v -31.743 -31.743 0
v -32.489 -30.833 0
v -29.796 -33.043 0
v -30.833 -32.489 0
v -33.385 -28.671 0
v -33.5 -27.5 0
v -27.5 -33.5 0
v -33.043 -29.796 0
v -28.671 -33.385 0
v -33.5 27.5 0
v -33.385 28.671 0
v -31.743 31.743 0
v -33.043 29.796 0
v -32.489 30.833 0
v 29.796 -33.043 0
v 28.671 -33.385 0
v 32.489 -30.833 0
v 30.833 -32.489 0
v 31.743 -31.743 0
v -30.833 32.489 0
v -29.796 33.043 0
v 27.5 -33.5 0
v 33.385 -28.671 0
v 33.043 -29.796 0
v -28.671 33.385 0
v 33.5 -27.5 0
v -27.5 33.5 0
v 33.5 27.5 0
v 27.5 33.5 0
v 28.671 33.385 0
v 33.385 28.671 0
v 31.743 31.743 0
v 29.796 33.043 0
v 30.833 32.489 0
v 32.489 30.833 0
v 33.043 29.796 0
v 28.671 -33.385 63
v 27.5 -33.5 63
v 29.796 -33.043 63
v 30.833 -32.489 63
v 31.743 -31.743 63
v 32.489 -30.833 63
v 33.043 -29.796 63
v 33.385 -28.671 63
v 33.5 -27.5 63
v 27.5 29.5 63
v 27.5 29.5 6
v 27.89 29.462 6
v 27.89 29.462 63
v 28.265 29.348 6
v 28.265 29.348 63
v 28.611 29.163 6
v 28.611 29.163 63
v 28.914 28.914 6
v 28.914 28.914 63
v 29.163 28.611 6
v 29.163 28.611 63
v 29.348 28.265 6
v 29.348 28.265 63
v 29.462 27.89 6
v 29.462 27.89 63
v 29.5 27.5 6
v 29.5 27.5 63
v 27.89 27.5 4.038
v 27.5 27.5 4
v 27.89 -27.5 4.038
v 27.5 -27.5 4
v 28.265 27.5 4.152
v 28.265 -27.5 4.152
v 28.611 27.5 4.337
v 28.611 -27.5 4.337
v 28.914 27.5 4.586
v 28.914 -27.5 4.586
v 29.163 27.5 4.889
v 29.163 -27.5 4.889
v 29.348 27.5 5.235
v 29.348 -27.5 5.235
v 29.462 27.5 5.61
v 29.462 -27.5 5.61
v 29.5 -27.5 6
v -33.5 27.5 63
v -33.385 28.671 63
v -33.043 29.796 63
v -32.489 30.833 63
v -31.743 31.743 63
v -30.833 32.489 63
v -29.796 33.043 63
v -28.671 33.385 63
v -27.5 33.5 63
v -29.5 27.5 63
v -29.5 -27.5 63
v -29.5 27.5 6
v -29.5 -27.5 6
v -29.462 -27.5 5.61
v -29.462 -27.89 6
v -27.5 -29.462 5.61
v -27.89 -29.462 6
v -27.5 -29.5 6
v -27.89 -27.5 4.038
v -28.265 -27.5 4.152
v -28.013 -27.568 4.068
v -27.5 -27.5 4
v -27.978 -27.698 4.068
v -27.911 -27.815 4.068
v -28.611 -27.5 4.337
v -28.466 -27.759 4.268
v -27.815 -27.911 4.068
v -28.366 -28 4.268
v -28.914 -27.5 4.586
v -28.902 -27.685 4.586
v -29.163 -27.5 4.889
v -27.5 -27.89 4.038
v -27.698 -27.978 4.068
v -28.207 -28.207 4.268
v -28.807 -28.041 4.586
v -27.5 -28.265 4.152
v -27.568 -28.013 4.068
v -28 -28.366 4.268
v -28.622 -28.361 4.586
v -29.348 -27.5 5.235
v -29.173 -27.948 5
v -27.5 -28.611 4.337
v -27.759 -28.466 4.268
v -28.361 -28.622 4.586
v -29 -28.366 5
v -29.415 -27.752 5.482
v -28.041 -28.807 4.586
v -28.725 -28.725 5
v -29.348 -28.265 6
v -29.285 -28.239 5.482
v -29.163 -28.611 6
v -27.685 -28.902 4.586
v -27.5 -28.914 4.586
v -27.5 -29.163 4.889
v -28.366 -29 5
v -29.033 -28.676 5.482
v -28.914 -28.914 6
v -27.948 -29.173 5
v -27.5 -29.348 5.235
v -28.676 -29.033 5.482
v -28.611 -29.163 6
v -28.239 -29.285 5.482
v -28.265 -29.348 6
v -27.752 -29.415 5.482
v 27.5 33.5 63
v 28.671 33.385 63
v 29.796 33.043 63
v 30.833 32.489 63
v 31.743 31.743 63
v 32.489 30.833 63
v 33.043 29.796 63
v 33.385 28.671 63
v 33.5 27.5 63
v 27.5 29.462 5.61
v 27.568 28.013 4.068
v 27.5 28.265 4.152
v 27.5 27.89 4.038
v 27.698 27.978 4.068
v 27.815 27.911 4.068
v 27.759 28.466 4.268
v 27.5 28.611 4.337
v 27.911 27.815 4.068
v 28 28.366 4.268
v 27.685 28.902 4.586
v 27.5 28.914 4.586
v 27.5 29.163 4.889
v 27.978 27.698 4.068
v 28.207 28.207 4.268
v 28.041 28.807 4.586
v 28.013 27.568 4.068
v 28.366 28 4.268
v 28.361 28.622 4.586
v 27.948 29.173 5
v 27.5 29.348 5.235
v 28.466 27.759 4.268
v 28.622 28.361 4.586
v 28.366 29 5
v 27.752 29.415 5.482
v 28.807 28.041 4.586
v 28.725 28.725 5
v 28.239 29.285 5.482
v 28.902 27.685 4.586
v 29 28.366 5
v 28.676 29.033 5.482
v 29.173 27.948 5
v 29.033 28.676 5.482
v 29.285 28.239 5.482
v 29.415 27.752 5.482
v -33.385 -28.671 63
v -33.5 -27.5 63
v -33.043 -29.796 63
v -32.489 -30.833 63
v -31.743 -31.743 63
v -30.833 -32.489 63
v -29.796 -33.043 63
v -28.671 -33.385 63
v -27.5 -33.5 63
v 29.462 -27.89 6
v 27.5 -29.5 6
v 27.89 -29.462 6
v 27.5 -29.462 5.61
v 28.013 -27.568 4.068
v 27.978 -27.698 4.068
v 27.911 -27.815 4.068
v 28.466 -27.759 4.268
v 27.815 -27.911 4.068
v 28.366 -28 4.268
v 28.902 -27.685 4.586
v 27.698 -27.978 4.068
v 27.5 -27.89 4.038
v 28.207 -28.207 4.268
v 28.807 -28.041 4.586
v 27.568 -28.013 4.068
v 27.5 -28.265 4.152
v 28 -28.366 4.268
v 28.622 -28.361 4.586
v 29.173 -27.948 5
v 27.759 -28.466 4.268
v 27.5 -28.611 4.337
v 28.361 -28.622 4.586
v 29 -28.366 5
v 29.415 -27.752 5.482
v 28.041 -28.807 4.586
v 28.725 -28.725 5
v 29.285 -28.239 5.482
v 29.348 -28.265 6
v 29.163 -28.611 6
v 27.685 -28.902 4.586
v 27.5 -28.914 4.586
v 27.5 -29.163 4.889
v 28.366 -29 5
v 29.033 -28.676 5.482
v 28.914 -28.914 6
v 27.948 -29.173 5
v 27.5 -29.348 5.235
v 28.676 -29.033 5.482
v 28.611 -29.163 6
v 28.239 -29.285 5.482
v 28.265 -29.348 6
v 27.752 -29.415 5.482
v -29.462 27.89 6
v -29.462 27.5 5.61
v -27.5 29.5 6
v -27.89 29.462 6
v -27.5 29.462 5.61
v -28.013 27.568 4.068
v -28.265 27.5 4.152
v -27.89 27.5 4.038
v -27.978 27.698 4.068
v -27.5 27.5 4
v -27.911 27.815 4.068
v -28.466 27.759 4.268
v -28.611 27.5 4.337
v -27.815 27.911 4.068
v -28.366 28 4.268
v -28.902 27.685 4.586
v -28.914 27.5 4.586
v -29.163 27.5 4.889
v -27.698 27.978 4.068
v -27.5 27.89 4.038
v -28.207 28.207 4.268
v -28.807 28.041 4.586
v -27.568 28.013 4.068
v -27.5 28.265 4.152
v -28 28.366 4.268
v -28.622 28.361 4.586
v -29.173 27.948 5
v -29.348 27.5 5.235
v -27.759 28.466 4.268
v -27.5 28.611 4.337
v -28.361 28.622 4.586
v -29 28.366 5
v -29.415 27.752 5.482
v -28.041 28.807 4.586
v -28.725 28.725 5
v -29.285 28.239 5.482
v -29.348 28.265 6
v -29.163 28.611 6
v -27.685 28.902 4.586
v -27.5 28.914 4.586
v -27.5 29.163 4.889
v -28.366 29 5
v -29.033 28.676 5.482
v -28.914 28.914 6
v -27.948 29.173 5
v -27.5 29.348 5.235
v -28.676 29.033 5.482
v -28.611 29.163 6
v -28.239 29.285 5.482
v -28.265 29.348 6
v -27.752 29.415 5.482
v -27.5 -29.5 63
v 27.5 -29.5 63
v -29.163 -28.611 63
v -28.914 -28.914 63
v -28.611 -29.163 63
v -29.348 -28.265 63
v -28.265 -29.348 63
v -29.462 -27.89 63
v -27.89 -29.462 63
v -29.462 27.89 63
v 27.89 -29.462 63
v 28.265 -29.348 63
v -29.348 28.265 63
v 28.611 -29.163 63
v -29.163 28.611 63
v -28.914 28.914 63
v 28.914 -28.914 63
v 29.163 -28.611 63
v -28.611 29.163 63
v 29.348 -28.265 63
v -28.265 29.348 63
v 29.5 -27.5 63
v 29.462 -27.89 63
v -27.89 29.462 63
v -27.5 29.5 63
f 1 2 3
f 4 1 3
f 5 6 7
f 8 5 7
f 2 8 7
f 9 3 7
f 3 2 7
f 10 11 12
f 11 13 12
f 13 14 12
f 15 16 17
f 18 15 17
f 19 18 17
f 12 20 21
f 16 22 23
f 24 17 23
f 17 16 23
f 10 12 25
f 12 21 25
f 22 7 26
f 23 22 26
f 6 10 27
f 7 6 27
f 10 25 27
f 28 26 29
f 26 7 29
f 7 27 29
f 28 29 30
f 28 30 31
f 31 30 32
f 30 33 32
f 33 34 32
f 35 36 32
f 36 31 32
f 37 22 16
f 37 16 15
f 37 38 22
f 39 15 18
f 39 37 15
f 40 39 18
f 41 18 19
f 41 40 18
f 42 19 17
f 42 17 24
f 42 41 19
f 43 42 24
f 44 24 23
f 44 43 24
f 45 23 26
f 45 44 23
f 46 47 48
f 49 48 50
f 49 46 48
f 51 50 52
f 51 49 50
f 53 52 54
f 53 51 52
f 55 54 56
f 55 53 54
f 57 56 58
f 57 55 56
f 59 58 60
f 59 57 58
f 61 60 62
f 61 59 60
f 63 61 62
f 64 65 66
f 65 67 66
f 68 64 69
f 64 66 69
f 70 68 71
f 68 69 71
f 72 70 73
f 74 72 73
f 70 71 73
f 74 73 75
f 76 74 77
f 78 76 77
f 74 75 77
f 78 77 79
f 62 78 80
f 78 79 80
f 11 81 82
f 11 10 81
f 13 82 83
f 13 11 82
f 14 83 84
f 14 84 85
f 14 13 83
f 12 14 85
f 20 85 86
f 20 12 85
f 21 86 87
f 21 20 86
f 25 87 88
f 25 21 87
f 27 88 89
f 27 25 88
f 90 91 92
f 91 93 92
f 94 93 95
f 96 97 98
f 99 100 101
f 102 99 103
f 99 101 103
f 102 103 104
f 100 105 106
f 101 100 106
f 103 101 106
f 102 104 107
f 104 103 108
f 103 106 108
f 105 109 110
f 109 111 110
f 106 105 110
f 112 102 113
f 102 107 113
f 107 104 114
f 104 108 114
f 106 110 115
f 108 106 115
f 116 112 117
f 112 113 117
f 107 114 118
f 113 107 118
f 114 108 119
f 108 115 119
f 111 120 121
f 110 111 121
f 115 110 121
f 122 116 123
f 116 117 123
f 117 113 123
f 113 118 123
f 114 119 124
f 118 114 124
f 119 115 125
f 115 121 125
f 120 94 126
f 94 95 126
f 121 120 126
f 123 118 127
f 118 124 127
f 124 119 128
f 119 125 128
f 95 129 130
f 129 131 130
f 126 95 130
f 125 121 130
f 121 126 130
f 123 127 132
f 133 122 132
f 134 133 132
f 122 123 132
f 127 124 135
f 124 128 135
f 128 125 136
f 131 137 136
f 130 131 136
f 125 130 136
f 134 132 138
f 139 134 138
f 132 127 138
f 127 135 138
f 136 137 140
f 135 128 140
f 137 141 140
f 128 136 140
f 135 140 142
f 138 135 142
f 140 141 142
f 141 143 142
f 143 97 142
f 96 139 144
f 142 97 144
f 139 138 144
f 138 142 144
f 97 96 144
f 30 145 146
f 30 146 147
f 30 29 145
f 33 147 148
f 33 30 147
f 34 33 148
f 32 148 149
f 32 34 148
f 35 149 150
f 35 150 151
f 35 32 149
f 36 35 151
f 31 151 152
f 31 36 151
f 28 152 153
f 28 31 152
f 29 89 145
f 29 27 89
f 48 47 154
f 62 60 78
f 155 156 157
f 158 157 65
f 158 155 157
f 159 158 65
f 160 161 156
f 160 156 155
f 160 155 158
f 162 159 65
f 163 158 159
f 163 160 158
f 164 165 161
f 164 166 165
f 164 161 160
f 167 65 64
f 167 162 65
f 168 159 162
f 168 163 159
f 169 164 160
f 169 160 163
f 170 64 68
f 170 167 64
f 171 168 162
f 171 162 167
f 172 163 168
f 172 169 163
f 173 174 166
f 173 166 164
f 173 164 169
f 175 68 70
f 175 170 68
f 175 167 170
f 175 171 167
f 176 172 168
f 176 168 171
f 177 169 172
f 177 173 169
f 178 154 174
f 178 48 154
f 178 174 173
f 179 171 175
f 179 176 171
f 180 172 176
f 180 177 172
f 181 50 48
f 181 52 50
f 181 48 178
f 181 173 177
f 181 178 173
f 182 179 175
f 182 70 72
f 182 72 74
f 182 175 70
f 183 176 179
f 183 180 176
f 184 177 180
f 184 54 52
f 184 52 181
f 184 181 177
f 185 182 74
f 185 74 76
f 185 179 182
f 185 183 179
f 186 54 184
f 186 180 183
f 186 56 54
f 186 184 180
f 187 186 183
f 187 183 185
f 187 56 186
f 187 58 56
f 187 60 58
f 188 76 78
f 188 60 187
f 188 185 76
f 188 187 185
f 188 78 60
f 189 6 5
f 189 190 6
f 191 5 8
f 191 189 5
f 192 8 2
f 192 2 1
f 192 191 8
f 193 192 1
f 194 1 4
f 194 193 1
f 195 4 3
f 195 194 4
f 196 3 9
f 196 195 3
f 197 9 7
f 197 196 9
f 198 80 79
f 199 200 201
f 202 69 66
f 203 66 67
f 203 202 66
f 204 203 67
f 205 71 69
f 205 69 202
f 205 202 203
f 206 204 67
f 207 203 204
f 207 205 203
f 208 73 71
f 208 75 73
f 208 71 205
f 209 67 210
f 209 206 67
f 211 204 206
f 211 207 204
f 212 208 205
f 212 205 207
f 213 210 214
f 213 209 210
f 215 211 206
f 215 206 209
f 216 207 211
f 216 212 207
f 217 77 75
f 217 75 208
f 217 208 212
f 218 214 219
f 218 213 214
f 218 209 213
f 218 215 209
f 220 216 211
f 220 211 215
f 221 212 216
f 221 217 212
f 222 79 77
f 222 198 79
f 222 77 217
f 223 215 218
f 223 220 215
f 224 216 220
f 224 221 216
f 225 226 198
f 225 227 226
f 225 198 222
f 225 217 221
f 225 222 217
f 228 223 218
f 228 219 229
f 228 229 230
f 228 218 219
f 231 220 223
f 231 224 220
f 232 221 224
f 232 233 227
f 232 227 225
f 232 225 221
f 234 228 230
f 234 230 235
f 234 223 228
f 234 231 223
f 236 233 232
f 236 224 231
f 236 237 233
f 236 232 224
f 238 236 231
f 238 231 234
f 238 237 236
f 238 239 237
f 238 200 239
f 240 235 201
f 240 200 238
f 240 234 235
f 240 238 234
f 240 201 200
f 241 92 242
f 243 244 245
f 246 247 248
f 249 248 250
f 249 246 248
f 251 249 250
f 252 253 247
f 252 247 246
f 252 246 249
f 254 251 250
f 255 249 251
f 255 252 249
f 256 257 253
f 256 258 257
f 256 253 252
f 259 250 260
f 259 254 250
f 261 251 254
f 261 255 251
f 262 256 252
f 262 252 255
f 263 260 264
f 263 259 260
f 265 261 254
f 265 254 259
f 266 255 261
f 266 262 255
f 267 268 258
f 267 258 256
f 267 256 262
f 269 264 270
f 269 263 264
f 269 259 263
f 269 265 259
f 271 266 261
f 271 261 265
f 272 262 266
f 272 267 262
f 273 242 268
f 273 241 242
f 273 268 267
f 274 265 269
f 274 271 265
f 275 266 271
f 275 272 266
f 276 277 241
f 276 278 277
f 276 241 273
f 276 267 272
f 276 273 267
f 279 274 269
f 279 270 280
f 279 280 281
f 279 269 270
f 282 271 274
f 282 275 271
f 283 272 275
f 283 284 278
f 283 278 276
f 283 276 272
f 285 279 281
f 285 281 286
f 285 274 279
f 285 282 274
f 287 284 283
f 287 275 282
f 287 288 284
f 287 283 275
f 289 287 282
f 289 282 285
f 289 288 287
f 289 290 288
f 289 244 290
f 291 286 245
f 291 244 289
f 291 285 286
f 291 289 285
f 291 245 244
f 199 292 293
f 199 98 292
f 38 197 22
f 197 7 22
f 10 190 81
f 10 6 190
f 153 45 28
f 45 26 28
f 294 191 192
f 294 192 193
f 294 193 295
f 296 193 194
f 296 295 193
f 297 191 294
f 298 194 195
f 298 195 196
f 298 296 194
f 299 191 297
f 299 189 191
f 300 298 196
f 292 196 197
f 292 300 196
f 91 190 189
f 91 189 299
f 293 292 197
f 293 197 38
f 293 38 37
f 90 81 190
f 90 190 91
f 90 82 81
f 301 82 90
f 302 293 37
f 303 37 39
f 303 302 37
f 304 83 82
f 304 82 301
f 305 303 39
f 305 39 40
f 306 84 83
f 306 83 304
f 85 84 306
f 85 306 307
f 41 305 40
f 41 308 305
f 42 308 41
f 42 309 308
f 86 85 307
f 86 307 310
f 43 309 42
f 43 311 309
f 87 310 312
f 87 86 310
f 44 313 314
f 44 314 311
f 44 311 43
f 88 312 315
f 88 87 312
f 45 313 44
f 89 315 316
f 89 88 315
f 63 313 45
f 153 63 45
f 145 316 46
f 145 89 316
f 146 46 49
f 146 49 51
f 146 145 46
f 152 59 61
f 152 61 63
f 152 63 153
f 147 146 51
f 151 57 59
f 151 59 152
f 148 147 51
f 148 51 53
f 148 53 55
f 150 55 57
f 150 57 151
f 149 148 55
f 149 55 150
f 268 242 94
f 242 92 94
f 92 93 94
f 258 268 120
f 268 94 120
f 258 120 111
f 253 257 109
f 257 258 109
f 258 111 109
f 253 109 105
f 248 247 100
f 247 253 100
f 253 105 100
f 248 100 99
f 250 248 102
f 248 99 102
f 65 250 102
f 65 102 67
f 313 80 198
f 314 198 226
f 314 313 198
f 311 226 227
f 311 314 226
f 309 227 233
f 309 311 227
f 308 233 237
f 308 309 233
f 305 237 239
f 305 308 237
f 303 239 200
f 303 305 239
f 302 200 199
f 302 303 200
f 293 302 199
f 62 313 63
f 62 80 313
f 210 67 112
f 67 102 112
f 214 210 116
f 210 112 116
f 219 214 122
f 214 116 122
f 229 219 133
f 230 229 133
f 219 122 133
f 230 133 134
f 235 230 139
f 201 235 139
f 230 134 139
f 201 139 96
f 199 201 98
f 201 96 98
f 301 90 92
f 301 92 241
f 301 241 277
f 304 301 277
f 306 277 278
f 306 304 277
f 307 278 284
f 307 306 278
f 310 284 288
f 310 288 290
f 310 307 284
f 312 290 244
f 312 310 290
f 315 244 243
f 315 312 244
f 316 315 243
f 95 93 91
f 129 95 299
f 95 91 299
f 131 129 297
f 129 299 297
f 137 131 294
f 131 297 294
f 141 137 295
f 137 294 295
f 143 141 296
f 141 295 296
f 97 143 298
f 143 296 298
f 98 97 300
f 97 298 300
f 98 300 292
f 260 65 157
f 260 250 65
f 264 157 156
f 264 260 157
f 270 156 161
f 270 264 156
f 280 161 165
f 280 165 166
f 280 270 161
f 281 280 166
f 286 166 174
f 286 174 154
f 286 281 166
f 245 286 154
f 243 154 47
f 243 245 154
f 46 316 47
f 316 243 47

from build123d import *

# Parameters (mm, degrees)
F0_W     = 67
F0_H     = 67
F0_W_2   = 59
F0_H_2   = 59
F1_DEPTH = 4
F2_DEPTH = 63
F3_R     = 2
F4_R     = 6


with BuildPart() as f1:
    # F0 (on Top) → F1 (new body)
    with BuildSketch(Plane.XY):
        Rectangle(F0_W, F0_H)
        Rectangle(F0_W_2, F0_H_2, mode=Mode.SUBTRACT)
        Rectangle(F0_W_2, F0_H_2)
    extrude(amount=F1_DEPTH)

    # F0 (on Top) → F2 (join)
    with BuildSketch(Plane.XY):
        Rectangle(F0_W, F0_H)
        Rectangle(F0_W_2, F0_H_2, mode=Mode.SUBTRACT)
    extrude(amount=F2_DEPTH)

    # F3
    f3_edges = [f1.edges().sort_by_distance(p)[0] for p in [
        (29.5, -29.5, 33.5),
        (-29.5, -29.5, 33.5),
        (-29.5, 29.5, 33.5),
        (29.5, 29.5, 33.5),
        (-29.5, 0, 4),
        (0, 29.5, 4),
        (29.5, 0, 4),
        (0, -29.5, 4),
    ]]
    fillet(f3_edges, radius=F3_R)

    # F4
    f4_edges = [f1.edges().sort_by_distance(p)[0] for p in [
        (-33.5, 33.5, 31.5),
        (-33.5, -33.5, 31.5),
        (33.5, -33.5, 31.5),
        (33.5, 33.5, 31.5),
    ]]
    fillet(f4_edges, radius=F4_R)


solid = f1.part
